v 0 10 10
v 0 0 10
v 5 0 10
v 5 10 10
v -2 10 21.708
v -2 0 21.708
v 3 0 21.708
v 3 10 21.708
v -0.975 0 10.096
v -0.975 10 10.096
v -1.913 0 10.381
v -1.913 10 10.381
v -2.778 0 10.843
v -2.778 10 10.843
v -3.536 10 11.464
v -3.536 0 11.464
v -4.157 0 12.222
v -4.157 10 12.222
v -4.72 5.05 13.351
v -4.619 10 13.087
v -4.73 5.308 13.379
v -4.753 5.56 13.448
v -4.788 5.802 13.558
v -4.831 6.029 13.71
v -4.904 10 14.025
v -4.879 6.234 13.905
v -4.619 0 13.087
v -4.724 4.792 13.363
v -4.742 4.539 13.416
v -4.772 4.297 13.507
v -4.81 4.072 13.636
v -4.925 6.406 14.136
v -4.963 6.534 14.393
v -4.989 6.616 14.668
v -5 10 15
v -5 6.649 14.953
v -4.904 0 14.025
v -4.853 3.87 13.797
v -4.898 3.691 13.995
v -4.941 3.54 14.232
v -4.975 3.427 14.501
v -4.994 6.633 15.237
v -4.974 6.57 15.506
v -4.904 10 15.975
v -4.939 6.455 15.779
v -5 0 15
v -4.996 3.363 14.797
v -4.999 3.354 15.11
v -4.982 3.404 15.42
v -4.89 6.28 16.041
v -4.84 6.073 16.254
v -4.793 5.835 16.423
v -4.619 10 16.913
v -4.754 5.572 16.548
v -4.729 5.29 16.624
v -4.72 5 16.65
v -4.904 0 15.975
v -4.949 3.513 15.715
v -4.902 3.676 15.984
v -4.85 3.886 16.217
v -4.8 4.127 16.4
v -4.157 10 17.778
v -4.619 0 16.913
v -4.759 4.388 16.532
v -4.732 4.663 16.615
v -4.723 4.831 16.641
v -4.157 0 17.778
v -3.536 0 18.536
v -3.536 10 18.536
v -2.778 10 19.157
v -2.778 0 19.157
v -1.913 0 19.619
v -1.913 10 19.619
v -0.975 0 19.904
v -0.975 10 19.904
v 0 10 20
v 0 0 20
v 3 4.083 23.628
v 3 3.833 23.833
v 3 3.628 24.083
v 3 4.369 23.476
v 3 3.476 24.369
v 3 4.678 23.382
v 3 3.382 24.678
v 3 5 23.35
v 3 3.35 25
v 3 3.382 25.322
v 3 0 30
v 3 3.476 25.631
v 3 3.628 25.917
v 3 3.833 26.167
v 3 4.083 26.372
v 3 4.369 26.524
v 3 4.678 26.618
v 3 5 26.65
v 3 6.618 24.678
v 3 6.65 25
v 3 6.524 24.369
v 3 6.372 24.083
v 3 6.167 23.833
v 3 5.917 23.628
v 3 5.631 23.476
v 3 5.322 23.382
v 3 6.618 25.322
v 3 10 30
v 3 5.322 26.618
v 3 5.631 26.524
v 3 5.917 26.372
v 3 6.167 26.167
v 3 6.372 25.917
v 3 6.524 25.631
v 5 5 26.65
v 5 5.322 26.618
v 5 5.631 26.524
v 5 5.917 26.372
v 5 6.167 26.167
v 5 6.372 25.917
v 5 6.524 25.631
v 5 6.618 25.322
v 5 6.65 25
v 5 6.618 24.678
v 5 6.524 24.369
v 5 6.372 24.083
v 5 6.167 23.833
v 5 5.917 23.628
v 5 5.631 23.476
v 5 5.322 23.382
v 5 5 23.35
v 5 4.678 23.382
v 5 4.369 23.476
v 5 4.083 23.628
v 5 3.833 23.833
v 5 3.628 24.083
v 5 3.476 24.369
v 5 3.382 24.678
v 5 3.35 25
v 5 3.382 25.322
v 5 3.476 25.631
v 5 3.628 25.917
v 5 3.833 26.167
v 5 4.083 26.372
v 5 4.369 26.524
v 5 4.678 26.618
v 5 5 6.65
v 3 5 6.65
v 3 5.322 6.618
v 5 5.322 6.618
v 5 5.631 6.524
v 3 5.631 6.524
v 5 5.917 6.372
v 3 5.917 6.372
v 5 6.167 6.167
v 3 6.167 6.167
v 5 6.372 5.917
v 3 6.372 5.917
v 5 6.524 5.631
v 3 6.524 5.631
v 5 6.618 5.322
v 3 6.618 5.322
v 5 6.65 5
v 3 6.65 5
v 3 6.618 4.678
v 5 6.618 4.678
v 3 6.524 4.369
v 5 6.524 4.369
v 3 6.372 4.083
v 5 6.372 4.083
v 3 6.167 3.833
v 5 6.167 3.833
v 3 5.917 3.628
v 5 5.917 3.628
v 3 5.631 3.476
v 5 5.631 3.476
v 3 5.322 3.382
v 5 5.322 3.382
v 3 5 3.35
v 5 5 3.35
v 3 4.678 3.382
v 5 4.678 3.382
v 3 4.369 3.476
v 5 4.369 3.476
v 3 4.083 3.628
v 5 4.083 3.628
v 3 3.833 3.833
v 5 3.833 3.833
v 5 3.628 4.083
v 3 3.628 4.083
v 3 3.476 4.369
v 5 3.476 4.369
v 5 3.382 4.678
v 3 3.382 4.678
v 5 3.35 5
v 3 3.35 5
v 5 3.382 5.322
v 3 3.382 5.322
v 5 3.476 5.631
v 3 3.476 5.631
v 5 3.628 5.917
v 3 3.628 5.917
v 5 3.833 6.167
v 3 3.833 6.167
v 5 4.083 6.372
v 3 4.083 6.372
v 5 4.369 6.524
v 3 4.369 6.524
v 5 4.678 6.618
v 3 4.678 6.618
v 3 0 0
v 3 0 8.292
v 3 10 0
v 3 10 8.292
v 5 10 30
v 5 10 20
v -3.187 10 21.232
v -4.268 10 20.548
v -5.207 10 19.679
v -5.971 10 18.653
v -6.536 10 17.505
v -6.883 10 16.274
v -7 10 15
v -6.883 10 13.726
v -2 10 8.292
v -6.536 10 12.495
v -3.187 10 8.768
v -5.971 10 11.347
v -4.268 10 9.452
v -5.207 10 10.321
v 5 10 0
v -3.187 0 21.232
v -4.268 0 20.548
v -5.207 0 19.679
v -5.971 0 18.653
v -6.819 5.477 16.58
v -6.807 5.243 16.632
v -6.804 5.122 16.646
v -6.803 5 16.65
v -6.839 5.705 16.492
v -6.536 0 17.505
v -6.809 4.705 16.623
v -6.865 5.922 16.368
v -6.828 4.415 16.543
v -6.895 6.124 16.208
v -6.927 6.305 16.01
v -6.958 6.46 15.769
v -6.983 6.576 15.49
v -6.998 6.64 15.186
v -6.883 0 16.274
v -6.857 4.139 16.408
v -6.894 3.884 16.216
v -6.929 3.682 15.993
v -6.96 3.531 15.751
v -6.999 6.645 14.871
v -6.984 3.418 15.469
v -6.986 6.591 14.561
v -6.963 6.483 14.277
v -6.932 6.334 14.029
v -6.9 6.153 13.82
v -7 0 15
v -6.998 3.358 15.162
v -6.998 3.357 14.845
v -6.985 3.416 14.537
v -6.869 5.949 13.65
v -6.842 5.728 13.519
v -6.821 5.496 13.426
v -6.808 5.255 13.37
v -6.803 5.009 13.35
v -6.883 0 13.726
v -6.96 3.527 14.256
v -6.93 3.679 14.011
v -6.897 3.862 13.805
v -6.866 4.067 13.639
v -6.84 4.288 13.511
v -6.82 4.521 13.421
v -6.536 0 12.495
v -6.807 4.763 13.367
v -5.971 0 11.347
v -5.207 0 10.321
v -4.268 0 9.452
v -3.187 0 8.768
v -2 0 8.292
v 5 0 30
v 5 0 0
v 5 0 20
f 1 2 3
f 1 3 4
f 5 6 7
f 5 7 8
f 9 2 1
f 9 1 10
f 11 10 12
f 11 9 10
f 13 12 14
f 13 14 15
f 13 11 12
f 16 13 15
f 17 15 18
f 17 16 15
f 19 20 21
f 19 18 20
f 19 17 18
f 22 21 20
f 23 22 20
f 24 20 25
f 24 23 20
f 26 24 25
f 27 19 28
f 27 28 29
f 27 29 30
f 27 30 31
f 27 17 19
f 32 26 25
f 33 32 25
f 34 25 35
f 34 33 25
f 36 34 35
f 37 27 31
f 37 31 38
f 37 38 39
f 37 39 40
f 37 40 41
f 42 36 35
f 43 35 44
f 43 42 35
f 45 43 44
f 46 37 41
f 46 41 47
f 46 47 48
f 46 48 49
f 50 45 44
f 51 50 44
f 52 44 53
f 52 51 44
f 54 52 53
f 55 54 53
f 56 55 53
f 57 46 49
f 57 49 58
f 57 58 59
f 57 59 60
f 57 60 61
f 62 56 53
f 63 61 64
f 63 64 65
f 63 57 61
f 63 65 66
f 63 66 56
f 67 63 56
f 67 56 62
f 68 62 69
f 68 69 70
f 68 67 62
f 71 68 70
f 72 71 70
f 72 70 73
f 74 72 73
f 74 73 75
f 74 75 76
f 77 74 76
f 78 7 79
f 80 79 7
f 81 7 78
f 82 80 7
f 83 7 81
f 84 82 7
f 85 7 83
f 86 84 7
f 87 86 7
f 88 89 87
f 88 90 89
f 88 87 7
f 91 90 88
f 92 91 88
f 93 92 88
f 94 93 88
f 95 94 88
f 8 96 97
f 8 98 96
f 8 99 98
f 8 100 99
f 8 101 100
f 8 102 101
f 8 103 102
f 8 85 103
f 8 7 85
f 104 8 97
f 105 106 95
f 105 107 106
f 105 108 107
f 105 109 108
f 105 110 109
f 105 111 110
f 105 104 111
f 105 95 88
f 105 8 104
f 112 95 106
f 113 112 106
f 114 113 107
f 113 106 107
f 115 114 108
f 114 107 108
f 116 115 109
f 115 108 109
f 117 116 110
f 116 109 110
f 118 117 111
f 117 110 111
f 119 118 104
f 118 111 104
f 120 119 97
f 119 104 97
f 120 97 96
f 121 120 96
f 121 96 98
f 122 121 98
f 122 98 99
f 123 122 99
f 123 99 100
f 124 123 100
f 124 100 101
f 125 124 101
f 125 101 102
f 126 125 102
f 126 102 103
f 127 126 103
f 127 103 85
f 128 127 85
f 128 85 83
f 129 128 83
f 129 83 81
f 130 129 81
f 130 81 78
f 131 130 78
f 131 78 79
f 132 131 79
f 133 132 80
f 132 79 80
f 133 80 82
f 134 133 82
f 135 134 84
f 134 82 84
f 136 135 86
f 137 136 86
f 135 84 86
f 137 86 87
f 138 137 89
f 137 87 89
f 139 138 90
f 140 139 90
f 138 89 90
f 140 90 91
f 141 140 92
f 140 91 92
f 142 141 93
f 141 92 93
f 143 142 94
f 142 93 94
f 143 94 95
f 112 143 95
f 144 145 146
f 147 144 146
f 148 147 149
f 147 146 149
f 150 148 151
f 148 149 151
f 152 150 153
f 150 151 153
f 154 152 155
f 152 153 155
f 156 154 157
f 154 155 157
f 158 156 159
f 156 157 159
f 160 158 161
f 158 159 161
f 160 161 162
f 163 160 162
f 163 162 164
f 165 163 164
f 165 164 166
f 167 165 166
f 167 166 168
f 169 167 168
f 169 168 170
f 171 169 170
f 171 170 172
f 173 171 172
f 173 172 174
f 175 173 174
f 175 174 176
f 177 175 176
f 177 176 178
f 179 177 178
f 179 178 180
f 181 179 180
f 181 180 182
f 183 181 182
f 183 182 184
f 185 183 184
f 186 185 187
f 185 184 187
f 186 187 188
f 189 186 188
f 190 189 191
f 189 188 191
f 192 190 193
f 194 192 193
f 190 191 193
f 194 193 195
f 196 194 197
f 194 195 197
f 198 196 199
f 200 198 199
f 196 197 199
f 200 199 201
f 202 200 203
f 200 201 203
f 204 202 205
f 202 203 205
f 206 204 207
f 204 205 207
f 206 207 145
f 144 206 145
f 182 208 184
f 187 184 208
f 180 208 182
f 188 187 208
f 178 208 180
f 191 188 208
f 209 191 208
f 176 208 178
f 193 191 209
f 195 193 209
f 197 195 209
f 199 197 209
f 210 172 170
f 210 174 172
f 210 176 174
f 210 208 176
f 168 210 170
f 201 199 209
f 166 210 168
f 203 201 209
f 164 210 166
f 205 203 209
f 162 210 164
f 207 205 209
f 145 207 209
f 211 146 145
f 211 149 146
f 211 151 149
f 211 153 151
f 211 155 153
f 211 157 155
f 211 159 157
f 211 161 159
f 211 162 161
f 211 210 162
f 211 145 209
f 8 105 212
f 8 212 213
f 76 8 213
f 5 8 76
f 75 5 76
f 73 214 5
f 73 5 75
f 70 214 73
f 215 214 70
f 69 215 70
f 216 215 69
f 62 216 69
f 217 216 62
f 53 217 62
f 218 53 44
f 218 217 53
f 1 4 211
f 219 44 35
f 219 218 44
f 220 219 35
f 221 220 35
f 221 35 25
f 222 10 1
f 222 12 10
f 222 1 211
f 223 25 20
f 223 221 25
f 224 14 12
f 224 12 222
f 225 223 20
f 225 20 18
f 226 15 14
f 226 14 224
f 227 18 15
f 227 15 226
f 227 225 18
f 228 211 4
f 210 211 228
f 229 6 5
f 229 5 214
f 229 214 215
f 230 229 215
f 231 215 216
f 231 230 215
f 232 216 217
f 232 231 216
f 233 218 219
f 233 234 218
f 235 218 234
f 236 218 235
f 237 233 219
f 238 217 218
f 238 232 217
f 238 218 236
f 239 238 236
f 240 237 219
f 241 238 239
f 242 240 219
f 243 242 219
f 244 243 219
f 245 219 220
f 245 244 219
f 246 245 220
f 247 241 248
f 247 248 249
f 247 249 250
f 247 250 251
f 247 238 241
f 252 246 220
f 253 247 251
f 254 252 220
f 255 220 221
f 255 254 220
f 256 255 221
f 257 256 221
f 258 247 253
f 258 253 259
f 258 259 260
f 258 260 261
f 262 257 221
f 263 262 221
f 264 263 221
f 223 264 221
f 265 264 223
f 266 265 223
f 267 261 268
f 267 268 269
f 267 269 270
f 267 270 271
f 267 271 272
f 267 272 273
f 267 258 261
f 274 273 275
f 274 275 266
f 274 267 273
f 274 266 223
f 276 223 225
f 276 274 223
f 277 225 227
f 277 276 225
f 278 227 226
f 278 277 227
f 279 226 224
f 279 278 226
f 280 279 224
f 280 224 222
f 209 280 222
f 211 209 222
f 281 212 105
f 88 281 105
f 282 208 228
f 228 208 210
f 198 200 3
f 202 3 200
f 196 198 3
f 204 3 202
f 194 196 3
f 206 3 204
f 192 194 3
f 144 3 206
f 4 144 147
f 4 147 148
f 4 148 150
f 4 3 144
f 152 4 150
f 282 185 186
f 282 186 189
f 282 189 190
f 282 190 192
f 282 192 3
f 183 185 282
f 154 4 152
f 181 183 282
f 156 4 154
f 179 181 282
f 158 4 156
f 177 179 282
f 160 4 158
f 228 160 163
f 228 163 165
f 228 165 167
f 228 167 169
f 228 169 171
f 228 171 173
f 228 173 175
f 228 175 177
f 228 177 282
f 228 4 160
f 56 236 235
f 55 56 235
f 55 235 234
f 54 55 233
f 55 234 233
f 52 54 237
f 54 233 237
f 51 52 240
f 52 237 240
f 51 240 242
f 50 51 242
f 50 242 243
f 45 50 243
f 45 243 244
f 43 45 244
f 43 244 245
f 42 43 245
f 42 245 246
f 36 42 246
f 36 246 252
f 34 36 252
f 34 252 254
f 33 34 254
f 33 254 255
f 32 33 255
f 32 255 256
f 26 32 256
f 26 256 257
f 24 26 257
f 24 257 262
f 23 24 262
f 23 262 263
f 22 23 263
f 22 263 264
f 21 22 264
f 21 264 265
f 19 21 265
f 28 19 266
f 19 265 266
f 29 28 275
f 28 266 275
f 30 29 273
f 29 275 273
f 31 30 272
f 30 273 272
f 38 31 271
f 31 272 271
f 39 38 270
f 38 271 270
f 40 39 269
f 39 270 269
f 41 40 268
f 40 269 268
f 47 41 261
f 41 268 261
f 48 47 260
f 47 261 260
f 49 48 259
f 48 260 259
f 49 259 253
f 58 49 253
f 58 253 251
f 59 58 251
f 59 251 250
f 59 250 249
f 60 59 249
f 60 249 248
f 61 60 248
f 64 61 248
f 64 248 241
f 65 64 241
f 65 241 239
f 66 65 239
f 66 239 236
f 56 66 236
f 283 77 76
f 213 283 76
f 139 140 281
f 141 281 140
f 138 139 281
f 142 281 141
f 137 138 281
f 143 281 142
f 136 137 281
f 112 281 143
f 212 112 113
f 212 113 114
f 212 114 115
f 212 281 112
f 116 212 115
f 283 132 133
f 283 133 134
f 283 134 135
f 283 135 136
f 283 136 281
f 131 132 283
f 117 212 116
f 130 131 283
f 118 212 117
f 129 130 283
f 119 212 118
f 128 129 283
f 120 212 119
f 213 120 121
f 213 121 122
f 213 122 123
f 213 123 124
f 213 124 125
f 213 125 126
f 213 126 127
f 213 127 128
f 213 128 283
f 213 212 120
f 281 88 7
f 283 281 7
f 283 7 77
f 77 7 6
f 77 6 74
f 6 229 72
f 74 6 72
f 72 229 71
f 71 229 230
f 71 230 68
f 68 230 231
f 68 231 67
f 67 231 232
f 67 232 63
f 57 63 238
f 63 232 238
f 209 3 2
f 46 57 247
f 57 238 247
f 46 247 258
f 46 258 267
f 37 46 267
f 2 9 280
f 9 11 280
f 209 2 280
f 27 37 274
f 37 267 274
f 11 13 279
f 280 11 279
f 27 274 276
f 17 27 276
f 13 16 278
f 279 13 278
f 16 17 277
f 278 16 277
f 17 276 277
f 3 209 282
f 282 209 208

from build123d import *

# Parameters (mm, degrees)
EXTRUDE_1_DEPTH              = 10
HOLE_WIZARD_M3_2_D           = 2.5
HOLE_WIZARD_M3_2_CSINK_D     = 2.55
HOLE_WIZARD_M3_2_CSINK_ANGLE = 90
SKETCH_15_W                  = 10
SKETCH_15_H                  = 10
EXTRUDE_2_DEPTH              = 5
HOLE_WIZARD_M3_1_D           = 2.5
HOLE_WIZARD_M3_1_CSINK_D     = 2.55
HOLE_WIZARD_M3_1_CSINK_ANGLE = 90
SKETCH_21_W                  = 8.291796068
SKETCH_21_H                  = 10
CUT_EXTRUDE_2_DEPTH          = 5
SKETCH_23_R                  = 1.65
CUT_EXTRUDE_3_DEPTH          = 10
SKETCH_24_R                  = 1.65
CUT_EXTRUDE_4_DEPTH          = 10


with BuildPart() as part:
    # 草图1 → 凸台-拉伸1 (new body)
    with BuildSketch(Plane(origin=(0, 0, 0), x_dir=(1, 0, 0), z_dir=(0, 1, 0))):
        with BuildLine():
            Line((0, 0), (0, -10))
            ThreePointArc((0, -10), (-5, -15), (0, -20))
            Line((0, -20), (0, -30))
            Line((0, -30), (-2, -30))
            Line((-2, -30), (-2, -21.708203932))
            ThreePointArc((-2, -21.708203932), (-7, -15), (-2, -8.291796068))
            Line((-2, -8.291796068), (-2, 0))
            Line((-2, 0), (0, 0))
        make_face()
    extrude(amount=EXTRUDE_1_DEPTH)

    # M3 螺纹孔的螺纹孔钻头2 (through all)
    with Locations(Plane.ZY.offset(7)):
        with Locations((15, 5)):
            CounterSinkHole(HOLE_WIZARD_M3_2_D / 2, HOLE_WIZARD_M3_2_CSINK_D / 2, counter_sink_angle=HOLE_WIZARD_M3_2_CSINK_ANGLE)

    # 草图15 → 凸台-拉伸2 (add)
    with BuildSketch(Plane(origin=(0, 0, 0), x_dir=(0, 0, -1), z_dir=(1, 0, 0))):
        with Locations((-5, 5)):
            Rectangle(SKETCH_15_W, SKETCH_15_H)
        with Locations((-25, 5)):
            Rectangle(SKETCH_15_W, SKETCH_15_H)
    extrude(amount=EXTRUDE_2_DEPTH)

    # M3 螺纹孔的螺纹孔钻头1 (through all)
    with Locations(Plane(origin=(5, 0, 0), x_dir=(0, 0, -1), z_dir=(1, 0, 0))):
        with Locations((-5, 5), (-25, 5)):
            CounterSinkHole(HOLE_WIZARD_M3_1_D / 2, HOLE_WIZARD_M3_1_CSINK_D / 2, counter_sink_angle=HOLE_WIZARD_M3_1_CSINK_ANGLE)

    # 草图21 → 切除-拉伸2 (cut)
    with BuildSketch(Plane.ZY.offset(2)):
        with Locations((4.145898034, 5)):
            Rectangle(SKETCH_21_W, SKETCH_21_H)
        with Locations((25.854101966, 5)):
            Rectangle(SKETCH_21_W, SKETCH_21_H)
    extrude(amount=-CUT_EXTRUDE_2_DEPTH, mode=Mode.SUBTRACT)

    # 草图23 → 切除-拉伸3 (cut)
    with BuildSketch(Plane.ZY.offset(-3)):
        with Locations((25, 5)):
            Circle(SKETCH_23_R)
        with Locations((5, 5)):
            Circle(SKETCH_23_R)
    extrude(amount=-CUT_EXTRUDE_3_DEPTH, mode=Mode.SUBTRACT)

    # 草图24 → 切除-拉伸4 (cut)
    with BuildSketch(Plane.ZY.offset(7)):
        with Locations((15, 5)):
            Circle(SKETCH_24_R)
    extrude(amount=-CUT_EXTRUDE_4_DEPTH, mode=Mode.SUBTRACT)


solid = part.part
